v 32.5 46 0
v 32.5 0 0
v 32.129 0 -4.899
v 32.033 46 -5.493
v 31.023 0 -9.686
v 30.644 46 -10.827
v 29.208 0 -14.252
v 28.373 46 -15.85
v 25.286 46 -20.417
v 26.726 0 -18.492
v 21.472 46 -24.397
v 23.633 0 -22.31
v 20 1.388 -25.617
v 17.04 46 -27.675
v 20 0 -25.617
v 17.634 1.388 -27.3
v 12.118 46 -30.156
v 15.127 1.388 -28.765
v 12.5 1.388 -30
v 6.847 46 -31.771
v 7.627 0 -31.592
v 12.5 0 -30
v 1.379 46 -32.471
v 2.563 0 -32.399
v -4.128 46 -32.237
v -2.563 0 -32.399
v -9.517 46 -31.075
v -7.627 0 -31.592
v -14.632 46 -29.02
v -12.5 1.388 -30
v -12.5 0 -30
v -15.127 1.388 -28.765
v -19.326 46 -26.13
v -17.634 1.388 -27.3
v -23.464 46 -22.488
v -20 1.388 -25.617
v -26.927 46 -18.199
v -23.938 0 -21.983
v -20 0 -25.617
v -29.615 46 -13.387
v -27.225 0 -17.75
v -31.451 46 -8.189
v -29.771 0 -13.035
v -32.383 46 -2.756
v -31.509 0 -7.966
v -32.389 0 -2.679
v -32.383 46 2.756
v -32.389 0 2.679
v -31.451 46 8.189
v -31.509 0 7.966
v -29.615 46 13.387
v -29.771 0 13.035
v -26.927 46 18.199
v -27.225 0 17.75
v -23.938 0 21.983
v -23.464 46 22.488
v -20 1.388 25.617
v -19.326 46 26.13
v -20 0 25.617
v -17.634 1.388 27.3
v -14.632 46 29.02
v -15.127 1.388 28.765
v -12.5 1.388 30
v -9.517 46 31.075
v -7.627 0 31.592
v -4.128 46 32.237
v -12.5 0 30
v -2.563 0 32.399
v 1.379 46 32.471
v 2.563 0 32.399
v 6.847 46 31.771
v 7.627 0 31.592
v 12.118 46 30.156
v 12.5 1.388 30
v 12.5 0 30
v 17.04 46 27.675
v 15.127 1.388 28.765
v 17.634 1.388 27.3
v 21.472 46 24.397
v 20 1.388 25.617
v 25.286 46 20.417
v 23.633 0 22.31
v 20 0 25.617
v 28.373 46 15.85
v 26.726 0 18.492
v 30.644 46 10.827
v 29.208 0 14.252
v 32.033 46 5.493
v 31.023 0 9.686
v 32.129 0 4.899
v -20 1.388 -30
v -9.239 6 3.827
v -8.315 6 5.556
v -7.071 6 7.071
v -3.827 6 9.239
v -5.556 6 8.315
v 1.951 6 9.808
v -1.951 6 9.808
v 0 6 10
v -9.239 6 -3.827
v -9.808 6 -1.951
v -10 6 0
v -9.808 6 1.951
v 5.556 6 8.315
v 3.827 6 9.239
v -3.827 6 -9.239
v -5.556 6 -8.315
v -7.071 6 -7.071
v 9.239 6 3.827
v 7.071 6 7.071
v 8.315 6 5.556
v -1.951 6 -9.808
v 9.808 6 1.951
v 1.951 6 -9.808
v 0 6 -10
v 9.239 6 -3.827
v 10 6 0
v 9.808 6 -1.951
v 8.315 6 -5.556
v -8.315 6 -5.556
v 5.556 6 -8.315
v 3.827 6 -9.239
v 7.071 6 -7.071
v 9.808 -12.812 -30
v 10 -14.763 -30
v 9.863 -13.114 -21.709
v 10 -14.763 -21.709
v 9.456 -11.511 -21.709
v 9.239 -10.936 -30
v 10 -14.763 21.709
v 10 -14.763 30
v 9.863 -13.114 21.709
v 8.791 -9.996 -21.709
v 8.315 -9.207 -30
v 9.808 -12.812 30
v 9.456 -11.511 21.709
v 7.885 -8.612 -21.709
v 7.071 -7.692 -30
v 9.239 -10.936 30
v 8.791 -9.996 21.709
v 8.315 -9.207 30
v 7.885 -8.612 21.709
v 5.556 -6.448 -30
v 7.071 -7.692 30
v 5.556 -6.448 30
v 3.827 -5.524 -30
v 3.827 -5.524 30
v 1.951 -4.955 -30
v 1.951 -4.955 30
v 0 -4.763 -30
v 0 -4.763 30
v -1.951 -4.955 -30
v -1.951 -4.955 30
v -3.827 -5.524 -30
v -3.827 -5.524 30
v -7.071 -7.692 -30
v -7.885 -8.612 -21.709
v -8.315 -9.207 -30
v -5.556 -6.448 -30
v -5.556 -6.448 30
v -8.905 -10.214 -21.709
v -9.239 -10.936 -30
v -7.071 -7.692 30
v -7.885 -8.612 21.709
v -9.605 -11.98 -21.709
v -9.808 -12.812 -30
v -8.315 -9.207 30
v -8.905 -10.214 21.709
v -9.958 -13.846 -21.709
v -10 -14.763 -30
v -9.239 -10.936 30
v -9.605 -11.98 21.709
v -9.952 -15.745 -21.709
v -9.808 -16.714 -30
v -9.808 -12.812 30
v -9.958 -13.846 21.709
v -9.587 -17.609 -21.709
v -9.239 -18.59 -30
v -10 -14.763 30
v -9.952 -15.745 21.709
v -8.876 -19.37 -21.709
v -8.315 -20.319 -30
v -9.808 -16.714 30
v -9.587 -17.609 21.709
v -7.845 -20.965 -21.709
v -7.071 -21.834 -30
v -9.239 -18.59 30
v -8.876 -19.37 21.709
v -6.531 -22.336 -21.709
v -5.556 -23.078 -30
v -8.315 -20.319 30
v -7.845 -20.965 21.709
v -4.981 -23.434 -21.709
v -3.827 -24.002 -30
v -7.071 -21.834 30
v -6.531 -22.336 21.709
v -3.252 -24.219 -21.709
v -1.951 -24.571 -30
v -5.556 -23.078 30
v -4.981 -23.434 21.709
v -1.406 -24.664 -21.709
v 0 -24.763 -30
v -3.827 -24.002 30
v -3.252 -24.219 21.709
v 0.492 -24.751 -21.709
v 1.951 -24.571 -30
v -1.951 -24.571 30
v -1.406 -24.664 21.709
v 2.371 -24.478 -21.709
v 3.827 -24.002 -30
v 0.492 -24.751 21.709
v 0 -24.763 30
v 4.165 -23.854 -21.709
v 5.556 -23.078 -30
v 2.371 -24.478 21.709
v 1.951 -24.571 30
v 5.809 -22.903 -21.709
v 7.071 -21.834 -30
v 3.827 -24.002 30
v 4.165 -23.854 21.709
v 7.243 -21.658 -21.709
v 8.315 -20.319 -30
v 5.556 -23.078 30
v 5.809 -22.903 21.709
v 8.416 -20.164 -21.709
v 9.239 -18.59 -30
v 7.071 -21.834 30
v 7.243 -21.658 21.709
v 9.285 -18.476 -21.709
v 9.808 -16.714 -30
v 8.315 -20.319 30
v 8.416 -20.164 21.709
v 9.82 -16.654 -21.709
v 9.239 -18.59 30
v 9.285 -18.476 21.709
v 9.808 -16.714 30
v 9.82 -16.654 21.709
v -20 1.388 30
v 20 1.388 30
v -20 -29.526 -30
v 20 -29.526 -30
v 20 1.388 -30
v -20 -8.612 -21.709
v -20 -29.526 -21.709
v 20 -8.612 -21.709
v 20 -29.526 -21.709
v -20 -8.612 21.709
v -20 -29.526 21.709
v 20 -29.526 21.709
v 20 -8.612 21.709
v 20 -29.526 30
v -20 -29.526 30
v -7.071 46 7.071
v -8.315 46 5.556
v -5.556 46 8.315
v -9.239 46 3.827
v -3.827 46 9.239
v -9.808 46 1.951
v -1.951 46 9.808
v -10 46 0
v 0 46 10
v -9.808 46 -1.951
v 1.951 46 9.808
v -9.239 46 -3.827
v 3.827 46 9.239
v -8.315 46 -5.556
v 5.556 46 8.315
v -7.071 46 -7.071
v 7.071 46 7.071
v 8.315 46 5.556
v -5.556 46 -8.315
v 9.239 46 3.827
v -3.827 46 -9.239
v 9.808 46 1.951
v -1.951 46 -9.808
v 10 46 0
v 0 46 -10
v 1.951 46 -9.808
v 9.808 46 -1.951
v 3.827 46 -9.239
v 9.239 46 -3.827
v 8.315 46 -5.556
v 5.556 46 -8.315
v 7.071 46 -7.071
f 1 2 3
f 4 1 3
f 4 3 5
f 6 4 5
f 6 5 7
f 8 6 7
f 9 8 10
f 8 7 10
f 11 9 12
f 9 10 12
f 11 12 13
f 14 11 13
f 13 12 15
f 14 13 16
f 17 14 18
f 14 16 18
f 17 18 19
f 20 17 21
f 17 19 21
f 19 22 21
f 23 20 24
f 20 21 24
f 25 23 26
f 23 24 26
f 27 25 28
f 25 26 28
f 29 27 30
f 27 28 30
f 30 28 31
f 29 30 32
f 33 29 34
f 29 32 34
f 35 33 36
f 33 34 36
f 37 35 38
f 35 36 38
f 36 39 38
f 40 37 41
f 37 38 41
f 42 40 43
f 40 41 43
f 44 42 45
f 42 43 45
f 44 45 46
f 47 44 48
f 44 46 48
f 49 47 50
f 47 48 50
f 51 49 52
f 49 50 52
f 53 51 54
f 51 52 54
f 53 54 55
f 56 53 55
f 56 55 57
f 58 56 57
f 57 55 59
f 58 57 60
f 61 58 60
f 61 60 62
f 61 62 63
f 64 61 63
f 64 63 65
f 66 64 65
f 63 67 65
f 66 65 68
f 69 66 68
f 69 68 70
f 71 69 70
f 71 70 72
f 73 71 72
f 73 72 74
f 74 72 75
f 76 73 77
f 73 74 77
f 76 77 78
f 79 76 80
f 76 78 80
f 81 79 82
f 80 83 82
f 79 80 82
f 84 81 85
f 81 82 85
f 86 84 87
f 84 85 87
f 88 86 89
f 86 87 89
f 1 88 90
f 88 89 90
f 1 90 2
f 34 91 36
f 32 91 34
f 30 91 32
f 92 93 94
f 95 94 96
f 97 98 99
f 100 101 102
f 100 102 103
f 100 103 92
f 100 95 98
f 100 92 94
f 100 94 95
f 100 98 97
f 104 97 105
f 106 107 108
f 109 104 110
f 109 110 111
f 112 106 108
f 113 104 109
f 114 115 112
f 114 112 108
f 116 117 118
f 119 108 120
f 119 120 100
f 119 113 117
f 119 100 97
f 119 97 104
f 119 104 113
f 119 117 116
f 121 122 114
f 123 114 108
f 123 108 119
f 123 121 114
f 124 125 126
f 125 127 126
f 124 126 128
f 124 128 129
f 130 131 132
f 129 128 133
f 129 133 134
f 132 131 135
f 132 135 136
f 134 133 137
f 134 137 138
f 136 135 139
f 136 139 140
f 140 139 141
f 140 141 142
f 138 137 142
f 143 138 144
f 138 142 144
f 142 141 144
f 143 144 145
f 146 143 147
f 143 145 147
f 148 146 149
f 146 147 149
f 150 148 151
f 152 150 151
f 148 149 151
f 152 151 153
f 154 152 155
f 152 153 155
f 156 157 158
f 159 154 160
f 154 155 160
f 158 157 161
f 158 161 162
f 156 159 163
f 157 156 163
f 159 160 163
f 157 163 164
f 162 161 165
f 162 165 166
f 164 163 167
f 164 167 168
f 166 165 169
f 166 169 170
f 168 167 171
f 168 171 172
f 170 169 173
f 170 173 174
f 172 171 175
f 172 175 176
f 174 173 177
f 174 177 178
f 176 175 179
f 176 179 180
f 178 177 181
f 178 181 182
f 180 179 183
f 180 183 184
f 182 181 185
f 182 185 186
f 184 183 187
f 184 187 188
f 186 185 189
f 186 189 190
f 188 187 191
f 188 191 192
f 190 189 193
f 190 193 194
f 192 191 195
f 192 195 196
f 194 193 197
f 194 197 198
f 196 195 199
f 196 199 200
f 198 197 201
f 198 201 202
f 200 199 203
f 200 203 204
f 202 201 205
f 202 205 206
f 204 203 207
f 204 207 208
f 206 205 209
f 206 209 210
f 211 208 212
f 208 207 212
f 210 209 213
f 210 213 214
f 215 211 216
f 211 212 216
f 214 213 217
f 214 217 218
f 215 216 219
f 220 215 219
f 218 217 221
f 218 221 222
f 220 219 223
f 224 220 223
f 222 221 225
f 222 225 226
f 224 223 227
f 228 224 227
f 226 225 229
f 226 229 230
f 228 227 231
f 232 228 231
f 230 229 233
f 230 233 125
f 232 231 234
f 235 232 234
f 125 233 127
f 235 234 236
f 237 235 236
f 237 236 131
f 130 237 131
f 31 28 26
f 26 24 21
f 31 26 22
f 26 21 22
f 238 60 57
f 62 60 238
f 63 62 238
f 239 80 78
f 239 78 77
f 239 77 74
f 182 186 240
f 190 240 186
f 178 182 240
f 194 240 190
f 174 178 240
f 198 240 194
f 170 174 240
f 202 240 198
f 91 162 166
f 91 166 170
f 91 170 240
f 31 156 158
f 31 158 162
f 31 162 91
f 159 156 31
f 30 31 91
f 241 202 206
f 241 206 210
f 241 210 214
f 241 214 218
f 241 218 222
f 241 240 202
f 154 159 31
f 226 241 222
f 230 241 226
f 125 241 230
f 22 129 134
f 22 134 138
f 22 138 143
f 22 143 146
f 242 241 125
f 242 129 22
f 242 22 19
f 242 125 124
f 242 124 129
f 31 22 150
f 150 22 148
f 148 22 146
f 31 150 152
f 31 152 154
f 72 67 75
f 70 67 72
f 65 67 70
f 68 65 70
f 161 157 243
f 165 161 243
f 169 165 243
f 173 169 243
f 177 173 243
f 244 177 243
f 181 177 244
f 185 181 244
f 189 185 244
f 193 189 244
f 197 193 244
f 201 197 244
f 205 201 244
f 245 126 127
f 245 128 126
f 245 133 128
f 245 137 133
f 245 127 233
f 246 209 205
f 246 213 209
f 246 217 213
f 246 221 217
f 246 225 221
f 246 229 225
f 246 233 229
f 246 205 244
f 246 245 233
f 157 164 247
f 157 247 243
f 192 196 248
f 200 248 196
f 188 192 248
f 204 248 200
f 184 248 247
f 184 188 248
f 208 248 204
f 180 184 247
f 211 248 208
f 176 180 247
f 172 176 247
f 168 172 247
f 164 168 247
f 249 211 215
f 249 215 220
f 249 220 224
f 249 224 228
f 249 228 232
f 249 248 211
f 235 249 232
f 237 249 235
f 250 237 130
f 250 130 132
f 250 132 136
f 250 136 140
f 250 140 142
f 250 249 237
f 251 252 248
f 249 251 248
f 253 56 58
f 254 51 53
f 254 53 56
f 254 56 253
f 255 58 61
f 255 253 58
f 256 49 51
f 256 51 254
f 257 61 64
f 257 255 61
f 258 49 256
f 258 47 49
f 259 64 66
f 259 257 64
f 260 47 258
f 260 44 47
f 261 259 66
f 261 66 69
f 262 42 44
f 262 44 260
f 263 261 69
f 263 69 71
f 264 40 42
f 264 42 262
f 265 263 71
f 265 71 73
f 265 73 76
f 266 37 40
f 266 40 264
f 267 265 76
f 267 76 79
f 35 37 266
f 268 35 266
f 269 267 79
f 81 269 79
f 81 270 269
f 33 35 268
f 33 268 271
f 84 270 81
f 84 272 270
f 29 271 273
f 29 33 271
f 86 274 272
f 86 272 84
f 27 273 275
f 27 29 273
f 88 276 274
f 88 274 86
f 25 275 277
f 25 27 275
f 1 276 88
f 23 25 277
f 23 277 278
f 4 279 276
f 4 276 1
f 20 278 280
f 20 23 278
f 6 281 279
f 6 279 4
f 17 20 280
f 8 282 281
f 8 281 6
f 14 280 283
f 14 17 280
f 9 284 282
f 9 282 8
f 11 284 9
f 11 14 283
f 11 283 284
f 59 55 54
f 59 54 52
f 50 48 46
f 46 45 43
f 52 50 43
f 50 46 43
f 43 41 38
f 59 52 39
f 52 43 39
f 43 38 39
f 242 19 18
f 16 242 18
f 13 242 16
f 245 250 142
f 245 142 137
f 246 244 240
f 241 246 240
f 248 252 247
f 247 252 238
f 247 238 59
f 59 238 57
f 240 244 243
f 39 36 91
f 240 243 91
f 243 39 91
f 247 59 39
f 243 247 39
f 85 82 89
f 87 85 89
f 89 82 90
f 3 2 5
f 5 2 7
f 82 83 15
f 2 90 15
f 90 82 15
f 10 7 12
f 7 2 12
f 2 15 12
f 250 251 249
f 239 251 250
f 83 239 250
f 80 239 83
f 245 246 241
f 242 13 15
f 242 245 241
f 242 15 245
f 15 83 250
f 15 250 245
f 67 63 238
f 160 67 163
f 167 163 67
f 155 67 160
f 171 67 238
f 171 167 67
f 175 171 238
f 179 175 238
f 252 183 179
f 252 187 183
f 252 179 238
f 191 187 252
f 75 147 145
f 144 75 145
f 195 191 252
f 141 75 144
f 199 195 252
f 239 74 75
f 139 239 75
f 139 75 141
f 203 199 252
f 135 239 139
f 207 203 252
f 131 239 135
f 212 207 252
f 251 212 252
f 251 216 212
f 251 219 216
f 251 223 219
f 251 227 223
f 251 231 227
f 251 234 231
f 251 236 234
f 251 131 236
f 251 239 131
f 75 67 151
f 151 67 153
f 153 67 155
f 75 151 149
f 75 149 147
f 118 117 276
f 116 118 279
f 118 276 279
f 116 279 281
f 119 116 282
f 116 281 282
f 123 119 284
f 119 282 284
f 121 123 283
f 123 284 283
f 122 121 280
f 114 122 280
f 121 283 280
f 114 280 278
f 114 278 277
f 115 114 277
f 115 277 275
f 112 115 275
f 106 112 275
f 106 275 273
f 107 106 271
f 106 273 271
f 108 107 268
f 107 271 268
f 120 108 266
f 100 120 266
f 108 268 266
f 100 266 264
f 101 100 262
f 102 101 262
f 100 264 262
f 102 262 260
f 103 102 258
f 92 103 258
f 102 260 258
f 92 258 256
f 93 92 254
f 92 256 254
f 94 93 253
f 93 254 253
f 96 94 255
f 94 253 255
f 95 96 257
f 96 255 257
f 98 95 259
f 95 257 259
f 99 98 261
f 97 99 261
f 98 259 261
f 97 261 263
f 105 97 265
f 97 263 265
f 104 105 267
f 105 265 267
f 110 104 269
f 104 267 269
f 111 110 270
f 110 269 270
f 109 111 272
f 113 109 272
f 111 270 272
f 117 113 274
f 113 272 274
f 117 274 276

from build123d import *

# Parameters (mm, degrees)
SKETCH1_R           = 32.5
BOSS_EXTRUDE1_DEPTH = 46
SKETCH2_R           = 10
CUT_EXTRUDE1_DEPTH  = 40
BOSS_EXTRUDE2_DEPTH = 20
SKETCH4_R           = 10
CUT_EXTRUDE2_DEPTH  = 42


with BuildPart() as part:
    # Sketch1 → Boss-Extrude1 (new body)
    with BuildSketch(Plane(origin=(0, 0, 0), x_dir=(1, 0, 0), z_dir=(0, 1, 0))):
        Circle(SKETCH1_R)
    extrude(amount=BOSS_EXTRUDE1_DEPTH)

    # Sketch2 → Cut-Extrude1 (cut)
    with BuildSketch(Plane(origin=(0, 46, 0), x_dir=(1, 0, 0), z_dir=(0, 1, 0))):
        Circle(SKETCH2_R)
    extrude(amount=-CUT_EXTRUDE1_DEPTH, mode=Mode.SUBTRACT)

    # Sketch3 → Boss-Extrude2 (add, symmetric)
    with BuildSketch(Plane(origin=(0, 0, 0), x_dir=(0, 0, -1), z_dir=(1, 0, 0))):
        Polygon((30, 1.387692851), (-30, 1.387692851), (-30, -29.525977517), (-21.708955771, -29.525977517), (-21.708955771, -8.612307149), (21.708955771, -8.612307149), (21.708955771, -29.525977517), (30, -29.525977517), align=None)
    extrude(amount=BOSS_EXTRUDE2_DEPTH, both=True)

    # Sketch4 → Cut-Extrude2 (cut, symmetric)
    with BuildSketch(Plane.XY):
        with Locations((0, -14.762988758)):
            Circle(SKETCH4_R)
    extrude(amount=CUT_EXTRUDE2_DEPTH, both=True, mode=Mode.SUBTRACT)


solid = part.part
